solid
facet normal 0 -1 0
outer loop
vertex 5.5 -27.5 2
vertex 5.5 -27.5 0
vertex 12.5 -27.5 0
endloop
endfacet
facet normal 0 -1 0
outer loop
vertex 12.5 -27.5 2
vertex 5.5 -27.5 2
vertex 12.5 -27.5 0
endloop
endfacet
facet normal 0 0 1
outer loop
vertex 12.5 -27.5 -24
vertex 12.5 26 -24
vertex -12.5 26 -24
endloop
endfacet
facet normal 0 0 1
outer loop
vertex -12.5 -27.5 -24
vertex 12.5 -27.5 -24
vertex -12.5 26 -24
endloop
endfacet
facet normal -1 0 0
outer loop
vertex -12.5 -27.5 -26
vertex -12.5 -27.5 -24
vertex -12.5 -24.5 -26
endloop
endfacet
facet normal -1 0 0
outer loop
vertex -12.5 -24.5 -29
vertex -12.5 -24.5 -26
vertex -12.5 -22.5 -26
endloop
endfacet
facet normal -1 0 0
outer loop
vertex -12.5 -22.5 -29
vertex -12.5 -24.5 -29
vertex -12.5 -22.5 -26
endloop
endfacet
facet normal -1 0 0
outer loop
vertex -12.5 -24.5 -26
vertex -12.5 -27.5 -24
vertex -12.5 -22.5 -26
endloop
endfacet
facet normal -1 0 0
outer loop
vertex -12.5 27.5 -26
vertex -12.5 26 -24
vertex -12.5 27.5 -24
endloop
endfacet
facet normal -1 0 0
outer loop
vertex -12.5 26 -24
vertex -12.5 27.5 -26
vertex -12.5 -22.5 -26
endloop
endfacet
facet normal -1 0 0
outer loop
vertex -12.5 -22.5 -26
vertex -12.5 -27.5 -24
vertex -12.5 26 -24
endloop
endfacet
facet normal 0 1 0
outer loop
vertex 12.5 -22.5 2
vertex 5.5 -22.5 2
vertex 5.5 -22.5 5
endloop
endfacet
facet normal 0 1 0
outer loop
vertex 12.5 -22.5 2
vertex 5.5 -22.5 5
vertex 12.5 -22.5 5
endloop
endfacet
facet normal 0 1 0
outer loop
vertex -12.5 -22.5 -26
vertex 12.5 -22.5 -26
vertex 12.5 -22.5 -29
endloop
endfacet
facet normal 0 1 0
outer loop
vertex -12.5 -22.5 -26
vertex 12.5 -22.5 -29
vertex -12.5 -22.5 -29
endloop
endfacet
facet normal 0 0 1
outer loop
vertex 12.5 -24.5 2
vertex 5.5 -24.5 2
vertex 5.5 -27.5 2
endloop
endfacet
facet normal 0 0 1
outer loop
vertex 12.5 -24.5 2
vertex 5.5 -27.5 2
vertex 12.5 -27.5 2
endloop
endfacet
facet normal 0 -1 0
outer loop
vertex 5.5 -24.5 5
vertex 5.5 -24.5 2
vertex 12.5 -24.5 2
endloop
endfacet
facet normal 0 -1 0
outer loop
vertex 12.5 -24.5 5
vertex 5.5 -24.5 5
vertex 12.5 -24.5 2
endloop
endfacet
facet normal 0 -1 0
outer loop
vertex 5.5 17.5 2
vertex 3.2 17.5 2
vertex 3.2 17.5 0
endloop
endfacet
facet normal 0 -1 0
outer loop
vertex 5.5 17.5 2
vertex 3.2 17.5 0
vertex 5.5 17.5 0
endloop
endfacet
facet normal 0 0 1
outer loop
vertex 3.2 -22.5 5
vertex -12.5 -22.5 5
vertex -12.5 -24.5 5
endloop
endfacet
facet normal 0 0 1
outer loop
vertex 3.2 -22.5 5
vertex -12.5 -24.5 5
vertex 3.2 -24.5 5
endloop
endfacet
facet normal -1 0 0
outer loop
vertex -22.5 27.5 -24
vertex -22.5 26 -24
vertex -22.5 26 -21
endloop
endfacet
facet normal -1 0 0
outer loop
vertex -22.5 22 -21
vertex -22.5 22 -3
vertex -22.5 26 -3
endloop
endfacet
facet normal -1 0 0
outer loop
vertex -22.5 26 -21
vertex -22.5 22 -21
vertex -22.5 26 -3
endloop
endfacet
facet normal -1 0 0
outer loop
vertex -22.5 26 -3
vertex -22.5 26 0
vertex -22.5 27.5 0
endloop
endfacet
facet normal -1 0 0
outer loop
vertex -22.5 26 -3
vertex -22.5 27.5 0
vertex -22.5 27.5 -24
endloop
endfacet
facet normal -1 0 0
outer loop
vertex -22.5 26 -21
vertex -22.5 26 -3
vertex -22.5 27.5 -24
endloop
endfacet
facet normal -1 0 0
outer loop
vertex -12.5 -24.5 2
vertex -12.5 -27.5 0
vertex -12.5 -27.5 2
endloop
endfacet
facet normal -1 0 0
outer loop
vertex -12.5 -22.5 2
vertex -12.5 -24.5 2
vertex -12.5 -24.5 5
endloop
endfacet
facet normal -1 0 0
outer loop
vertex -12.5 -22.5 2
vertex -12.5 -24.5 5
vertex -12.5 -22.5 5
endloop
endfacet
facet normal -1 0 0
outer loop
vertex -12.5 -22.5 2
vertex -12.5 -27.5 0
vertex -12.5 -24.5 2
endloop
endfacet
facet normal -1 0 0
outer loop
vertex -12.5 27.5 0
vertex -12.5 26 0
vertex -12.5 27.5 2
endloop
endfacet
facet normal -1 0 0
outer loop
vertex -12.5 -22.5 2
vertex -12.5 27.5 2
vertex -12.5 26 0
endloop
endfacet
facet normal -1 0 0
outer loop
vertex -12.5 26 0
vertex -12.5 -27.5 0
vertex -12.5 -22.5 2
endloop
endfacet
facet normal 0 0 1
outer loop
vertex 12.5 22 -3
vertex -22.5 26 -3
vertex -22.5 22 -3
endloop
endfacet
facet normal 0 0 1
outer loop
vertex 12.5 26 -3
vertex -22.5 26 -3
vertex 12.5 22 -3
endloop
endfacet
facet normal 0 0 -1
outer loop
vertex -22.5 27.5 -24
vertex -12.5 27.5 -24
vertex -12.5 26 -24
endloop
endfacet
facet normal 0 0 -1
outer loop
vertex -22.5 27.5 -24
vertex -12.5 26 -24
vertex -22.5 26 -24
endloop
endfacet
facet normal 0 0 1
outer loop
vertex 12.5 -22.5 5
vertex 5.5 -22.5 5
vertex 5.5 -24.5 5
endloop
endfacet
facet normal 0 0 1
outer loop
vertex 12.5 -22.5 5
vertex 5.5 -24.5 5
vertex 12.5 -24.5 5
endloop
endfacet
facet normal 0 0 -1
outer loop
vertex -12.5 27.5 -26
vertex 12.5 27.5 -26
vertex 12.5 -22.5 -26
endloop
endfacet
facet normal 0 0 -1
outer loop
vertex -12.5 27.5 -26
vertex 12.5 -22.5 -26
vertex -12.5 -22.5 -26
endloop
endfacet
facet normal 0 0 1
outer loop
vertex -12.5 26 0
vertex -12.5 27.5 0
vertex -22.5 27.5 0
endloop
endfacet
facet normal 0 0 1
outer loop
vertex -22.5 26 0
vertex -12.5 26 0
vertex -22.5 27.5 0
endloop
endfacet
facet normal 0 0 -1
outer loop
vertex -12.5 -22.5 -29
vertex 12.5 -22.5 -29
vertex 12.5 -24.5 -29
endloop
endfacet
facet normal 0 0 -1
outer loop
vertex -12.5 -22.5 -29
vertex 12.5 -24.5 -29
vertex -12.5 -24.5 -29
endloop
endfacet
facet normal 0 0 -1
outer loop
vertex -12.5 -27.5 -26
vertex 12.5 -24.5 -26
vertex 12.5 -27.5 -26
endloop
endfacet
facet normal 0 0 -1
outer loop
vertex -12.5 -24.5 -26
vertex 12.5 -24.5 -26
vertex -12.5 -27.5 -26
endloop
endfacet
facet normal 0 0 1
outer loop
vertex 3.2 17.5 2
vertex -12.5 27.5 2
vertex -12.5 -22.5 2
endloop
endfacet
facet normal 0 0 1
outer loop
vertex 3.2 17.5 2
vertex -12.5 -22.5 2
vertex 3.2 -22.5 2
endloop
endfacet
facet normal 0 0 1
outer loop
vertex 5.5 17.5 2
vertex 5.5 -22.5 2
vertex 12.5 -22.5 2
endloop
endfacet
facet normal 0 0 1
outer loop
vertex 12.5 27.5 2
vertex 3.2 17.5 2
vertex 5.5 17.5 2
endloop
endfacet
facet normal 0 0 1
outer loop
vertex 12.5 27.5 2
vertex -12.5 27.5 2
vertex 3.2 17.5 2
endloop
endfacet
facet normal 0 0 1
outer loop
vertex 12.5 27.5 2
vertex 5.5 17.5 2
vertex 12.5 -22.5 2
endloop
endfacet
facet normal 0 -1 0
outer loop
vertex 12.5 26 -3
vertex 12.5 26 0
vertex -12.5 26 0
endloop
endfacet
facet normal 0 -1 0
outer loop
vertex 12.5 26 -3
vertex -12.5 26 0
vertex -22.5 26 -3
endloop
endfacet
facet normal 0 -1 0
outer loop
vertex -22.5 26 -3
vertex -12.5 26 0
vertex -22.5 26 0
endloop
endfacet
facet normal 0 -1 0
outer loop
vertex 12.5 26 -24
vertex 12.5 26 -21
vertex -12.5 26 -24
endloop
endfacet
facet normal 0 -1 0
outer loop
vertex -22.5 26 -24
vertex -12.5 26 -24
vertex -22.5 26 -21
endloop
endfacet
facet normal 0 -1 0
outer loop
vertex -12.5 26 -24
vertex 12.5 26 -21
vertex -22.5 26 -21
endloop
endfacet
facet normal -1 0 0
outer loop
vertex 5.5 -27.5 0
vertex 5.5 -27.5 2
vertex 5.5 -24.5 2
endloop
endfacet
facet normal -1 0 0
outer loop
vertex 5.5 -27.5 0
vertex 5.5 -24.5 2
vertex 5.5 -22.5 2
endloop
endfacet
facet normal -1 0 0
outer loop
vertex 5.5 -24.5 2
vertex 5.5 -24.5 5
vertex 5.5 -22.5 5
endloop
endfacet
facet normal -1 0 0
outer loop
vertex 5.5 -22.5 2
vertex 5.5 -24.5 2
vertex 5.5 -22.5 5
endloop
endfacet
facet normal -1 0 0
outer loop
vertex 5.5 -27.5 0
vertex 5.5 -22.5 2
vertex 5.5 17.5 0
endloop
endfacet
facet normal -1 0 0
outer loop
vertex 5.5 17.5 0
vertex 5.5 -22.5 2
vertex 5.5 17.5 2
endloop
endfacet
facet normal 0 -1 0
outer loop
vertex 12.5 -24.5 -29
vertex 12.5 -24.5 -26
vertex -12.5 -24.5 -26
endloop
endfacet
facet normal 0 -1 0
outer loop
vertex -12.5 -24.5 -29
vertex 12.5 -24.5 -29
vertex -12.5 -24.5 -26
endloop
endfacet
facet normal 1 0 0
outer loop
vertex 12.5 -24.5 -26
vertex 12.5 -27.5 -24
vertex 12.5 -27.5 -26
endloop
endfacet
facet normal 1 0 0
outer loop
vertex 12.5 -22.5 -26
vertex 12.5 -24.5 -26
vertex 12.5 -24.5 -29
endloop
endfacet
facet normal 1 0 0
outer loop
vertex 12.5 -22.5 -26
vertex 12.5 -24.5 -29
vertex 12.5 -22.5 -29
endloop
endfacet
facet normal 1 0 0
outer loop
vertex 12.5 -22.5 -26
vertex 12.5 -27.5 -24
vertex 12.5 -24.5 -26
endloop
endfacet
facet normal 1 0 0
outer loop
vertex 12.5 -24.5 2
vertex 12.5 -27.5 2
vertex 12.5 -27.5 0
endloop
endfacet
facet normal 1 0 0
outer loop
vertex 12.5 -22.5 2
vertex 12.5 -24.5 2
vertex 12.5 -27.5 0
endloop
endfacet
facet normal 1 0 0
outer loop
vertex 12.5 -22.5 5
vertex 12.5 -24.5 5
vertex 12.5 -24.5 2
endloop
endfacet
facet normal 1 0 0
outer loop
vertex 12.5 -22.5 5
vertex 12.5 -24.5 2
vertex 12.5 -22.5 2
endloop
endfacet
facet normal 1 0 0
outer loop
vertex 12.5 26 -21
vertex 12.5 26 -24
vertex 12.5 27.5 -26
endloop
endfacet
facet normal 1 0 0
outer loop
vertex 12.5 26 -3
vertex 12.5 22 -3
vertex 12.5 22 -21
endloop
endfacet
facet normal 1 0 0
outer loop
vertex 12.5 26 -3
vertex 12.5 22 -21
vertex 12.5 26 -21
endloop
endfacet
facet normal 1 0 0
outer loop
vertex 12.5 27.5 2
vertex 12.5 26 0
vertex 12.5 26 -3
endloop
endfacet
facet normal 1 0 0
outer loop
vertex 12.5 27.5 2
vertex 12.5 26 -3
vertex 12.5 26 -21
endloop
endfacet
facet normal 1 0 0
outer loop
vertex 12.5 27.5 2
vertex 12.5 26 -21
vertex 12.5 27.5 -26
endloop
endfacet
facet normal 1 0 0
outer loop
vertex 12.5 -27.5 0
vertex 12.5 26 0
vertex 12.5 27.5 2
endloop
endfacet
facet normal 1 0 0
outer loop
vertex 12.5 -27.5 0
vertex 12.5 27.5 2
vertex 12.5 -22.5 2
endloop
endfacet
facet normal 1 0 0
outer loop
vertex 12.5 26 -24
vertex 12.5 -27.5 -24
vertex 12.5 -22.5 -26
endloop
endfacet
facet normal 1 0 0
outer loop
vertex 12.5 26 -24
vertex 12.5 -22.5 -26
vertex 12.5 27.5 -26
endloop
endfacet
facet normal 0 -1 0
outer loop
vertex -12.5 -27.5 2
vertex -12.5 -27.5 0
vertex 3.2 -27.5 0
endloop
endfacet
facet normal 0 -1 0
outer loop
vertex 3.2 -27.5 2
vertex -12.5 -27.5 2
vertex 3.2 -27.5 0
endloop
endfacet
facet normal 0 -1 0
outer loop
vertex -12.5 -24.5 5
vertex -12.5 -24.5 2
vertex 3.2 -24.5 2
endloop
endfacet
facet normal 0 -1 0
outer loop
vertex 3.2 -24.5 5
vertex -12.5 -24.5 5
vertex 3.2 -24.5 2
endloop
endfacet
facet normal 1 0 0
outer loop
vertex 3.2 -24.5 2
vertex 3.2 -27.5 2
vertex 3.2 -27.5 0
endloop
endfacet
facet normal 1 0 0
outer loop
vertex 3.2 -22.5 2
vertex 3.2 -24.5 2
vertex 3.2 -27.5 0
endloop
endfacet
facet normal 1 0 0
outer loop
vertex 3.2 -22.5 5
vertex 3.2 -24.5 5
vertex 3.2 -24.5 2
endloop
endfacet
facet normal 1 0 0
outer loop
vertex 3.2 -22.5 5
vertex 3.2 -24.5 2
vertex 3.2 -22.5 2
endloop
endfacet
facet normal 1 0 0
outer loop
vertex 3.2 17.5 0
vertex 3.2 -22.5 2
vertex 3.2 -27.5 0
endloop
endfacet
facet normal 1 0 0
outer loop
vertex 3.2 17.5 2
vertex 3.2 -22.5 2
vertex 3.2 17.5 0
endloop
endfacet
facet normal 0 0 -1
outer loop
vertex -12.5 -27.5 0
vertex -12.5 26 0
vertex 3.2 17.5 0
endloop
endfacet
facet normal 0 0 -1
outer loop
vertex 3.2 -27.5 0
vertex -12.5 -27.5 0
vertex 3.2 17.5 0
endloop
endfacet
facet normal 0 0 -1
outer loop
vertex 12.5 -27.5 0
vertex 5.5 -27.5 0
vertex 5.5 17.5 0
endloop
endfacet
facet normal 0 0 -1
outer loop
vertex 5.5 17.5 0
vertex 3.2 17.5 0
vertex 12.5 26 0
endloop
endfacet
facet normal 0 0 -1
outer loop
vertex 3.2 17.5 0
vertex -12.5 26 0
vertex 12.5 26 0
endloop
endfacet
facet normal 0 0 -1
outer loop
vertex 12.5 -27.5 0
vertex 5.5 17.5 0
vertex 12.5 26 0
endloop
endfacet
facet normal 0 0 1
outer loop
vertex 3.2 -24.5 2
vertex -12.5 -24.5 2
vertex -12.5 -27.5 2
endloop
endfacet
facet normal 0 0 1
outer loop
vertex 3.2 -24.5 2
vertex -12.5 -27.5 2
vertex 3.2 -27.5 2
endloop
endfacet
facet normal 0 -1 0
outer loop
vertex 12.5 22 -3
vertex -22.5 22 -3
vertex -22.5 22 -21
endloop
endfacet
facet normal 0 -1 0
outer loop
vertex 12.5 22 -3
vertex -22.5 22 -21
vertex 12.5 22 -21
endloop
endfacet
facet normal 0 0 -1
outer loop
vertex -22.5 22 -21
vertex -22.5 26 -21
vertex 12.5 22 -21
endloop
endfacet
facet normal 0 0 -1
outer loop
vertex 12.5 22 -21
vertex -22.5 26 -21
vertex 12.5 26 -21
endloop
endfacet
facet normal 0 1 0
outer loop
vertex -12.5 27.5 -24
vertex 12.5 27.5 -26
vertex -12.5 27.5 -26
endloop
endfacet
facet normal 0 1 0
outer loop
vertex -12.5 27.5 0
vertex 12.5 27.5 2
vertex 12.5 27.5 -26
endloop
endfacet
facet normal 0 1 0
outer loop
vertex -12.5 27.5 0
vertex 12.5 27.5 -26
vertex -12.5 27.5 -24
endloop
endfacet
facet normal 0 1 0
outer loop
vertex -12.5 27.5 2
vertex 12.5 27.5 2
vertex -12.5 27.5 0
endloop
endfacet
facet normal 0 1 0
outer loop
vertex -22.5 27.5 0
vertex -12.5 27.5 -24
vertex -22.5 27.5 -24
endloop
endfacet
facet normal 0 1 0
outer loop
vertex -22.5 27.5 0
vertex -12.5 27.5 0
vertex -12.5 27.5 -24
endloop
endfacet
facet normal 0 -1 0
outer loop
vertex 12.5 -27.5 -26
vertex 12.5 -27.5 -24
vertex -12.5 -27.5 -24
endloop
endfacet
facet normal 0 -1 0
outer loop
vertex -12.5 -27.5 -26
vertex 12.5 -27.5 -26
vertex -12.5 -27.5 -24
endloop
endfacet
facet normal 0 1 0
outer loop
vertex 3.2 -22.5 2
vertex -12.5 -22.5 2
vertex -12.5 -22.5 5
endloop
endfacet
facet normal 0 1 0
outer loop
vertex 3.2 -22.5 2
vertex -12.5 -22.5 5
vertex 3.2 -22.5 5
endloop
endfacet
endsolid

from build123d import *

# Parameters (mm, degrees)
SKETCH1_W           = 25
SKETCH1_H           = 55
BOSS_EXTRUDE1_DEPTH = 2
SKETCH2_W           = 35
SKETCH2_H           = 1.5
BOSS_EXTRUDE2_DEPTH = 24
SKETCH3_W           = 25
SKETCH3_H           = 55
BOSS_EXTRUDE3_DEPTH = 2
SKETCH4_W           = 35
SKETCH4_H           = 18
BOSS_EXTRUDE4_DEPTH = 4
SKETCH5_W           = 2.3
SKETCH5_H           = 45
CUT_EXTRUDE1_DEPTH  = 2
SKETCH6_W           = 15.7
SKETCH6_H           = 2
SKETCH6_W_2         = 7
BOSS_EXTRUDE5_DEPTH = 3
SKETCH7_W           = 25
SKETCH7_H           = 2
BOSS_EXTRUDE6_DEPTH = 3


with BuildPart() as part:
    # Sketch1 → Boss-Extrude1 (new body)
    with BuildSketch(Plane.XY):
        Rectangle(SKETCH1_W, SKETCH1_H)
    extrude(amount=BOSS_EXTRUDE1_DEPTH)

    # Sketch2 → Boss-Extrude2 (add)
    with BuildSketch(Plane(origin=(0, 0, 0), x_dir=(-1, 0, 0), z_dir=(0, 0, -1))):
        with Locations((5, 26.75)):
            Rectangle(SKETCH2_W, SKETCH2_H)
    extrude(amount=BOSS_EXTRUDE2_DEPTH)

    # Sketch3 → Boss-Extrude3 (add)
    with BuildSketch(Plane(origin=(0, 0, -24), x_dir=(-1, 0, 0), z_dir=(0, 0, -1))):
        Rectangle(SKETCH3_W, SKETCH3_H)
    extrude(amount=BOSS_EXTRUDE3_DEPTH)

    # Sketch4 → Boss-Extrude4 (add)
    with BuildSketch(Plane.XZ.offset(-26)):
        with Locations((-5, -12)):
            Rectangle(SKETCH4_W, SKETCH4_H)
    extrude(amount=BOSS_EXTRUDE4_DEPTH)

    # Sketch5 → Cut-Extrude1 (cut)
    with BuildSketch(Plane.XY.offset(2)):
        with Locations((4.35, -5)):
            Rectangle(SKETCH5_W, SKETCH5_H)
    extrude(amount=-CUT_EXTRUDE1_DEPTH, mode=Mode.SUBTRACT)

    # Sketch6 → Boss-Extrude5 (add)
    with BuildSketch(Plane.XY.offset(2)):
        with Locations((-4.65, -23.5)):
            Rectangle(SKETCH6_W, SKETCH6_H)
        with Locations((9, -23.5)):
            Rectangle(SKETCH6_W_2, SKETCH6_H)
    extrude(amount=BOSS_EXTRUDE5_DEPTH)

    # Sketch7 → Boss-Extrude6 (add)
    with BuildSketch(Plane(origin=(0, 0, -26), x_dir=(-1, 0, 0), z_dir=(0, 0, -1))):
        with Locations((0, -23.5)):
            Rectangle(SKETCH7_W, SKETCH7_H)
    extrude(amount=BOSS_EXTRUDE6_DEPTH)


solid = part.part
